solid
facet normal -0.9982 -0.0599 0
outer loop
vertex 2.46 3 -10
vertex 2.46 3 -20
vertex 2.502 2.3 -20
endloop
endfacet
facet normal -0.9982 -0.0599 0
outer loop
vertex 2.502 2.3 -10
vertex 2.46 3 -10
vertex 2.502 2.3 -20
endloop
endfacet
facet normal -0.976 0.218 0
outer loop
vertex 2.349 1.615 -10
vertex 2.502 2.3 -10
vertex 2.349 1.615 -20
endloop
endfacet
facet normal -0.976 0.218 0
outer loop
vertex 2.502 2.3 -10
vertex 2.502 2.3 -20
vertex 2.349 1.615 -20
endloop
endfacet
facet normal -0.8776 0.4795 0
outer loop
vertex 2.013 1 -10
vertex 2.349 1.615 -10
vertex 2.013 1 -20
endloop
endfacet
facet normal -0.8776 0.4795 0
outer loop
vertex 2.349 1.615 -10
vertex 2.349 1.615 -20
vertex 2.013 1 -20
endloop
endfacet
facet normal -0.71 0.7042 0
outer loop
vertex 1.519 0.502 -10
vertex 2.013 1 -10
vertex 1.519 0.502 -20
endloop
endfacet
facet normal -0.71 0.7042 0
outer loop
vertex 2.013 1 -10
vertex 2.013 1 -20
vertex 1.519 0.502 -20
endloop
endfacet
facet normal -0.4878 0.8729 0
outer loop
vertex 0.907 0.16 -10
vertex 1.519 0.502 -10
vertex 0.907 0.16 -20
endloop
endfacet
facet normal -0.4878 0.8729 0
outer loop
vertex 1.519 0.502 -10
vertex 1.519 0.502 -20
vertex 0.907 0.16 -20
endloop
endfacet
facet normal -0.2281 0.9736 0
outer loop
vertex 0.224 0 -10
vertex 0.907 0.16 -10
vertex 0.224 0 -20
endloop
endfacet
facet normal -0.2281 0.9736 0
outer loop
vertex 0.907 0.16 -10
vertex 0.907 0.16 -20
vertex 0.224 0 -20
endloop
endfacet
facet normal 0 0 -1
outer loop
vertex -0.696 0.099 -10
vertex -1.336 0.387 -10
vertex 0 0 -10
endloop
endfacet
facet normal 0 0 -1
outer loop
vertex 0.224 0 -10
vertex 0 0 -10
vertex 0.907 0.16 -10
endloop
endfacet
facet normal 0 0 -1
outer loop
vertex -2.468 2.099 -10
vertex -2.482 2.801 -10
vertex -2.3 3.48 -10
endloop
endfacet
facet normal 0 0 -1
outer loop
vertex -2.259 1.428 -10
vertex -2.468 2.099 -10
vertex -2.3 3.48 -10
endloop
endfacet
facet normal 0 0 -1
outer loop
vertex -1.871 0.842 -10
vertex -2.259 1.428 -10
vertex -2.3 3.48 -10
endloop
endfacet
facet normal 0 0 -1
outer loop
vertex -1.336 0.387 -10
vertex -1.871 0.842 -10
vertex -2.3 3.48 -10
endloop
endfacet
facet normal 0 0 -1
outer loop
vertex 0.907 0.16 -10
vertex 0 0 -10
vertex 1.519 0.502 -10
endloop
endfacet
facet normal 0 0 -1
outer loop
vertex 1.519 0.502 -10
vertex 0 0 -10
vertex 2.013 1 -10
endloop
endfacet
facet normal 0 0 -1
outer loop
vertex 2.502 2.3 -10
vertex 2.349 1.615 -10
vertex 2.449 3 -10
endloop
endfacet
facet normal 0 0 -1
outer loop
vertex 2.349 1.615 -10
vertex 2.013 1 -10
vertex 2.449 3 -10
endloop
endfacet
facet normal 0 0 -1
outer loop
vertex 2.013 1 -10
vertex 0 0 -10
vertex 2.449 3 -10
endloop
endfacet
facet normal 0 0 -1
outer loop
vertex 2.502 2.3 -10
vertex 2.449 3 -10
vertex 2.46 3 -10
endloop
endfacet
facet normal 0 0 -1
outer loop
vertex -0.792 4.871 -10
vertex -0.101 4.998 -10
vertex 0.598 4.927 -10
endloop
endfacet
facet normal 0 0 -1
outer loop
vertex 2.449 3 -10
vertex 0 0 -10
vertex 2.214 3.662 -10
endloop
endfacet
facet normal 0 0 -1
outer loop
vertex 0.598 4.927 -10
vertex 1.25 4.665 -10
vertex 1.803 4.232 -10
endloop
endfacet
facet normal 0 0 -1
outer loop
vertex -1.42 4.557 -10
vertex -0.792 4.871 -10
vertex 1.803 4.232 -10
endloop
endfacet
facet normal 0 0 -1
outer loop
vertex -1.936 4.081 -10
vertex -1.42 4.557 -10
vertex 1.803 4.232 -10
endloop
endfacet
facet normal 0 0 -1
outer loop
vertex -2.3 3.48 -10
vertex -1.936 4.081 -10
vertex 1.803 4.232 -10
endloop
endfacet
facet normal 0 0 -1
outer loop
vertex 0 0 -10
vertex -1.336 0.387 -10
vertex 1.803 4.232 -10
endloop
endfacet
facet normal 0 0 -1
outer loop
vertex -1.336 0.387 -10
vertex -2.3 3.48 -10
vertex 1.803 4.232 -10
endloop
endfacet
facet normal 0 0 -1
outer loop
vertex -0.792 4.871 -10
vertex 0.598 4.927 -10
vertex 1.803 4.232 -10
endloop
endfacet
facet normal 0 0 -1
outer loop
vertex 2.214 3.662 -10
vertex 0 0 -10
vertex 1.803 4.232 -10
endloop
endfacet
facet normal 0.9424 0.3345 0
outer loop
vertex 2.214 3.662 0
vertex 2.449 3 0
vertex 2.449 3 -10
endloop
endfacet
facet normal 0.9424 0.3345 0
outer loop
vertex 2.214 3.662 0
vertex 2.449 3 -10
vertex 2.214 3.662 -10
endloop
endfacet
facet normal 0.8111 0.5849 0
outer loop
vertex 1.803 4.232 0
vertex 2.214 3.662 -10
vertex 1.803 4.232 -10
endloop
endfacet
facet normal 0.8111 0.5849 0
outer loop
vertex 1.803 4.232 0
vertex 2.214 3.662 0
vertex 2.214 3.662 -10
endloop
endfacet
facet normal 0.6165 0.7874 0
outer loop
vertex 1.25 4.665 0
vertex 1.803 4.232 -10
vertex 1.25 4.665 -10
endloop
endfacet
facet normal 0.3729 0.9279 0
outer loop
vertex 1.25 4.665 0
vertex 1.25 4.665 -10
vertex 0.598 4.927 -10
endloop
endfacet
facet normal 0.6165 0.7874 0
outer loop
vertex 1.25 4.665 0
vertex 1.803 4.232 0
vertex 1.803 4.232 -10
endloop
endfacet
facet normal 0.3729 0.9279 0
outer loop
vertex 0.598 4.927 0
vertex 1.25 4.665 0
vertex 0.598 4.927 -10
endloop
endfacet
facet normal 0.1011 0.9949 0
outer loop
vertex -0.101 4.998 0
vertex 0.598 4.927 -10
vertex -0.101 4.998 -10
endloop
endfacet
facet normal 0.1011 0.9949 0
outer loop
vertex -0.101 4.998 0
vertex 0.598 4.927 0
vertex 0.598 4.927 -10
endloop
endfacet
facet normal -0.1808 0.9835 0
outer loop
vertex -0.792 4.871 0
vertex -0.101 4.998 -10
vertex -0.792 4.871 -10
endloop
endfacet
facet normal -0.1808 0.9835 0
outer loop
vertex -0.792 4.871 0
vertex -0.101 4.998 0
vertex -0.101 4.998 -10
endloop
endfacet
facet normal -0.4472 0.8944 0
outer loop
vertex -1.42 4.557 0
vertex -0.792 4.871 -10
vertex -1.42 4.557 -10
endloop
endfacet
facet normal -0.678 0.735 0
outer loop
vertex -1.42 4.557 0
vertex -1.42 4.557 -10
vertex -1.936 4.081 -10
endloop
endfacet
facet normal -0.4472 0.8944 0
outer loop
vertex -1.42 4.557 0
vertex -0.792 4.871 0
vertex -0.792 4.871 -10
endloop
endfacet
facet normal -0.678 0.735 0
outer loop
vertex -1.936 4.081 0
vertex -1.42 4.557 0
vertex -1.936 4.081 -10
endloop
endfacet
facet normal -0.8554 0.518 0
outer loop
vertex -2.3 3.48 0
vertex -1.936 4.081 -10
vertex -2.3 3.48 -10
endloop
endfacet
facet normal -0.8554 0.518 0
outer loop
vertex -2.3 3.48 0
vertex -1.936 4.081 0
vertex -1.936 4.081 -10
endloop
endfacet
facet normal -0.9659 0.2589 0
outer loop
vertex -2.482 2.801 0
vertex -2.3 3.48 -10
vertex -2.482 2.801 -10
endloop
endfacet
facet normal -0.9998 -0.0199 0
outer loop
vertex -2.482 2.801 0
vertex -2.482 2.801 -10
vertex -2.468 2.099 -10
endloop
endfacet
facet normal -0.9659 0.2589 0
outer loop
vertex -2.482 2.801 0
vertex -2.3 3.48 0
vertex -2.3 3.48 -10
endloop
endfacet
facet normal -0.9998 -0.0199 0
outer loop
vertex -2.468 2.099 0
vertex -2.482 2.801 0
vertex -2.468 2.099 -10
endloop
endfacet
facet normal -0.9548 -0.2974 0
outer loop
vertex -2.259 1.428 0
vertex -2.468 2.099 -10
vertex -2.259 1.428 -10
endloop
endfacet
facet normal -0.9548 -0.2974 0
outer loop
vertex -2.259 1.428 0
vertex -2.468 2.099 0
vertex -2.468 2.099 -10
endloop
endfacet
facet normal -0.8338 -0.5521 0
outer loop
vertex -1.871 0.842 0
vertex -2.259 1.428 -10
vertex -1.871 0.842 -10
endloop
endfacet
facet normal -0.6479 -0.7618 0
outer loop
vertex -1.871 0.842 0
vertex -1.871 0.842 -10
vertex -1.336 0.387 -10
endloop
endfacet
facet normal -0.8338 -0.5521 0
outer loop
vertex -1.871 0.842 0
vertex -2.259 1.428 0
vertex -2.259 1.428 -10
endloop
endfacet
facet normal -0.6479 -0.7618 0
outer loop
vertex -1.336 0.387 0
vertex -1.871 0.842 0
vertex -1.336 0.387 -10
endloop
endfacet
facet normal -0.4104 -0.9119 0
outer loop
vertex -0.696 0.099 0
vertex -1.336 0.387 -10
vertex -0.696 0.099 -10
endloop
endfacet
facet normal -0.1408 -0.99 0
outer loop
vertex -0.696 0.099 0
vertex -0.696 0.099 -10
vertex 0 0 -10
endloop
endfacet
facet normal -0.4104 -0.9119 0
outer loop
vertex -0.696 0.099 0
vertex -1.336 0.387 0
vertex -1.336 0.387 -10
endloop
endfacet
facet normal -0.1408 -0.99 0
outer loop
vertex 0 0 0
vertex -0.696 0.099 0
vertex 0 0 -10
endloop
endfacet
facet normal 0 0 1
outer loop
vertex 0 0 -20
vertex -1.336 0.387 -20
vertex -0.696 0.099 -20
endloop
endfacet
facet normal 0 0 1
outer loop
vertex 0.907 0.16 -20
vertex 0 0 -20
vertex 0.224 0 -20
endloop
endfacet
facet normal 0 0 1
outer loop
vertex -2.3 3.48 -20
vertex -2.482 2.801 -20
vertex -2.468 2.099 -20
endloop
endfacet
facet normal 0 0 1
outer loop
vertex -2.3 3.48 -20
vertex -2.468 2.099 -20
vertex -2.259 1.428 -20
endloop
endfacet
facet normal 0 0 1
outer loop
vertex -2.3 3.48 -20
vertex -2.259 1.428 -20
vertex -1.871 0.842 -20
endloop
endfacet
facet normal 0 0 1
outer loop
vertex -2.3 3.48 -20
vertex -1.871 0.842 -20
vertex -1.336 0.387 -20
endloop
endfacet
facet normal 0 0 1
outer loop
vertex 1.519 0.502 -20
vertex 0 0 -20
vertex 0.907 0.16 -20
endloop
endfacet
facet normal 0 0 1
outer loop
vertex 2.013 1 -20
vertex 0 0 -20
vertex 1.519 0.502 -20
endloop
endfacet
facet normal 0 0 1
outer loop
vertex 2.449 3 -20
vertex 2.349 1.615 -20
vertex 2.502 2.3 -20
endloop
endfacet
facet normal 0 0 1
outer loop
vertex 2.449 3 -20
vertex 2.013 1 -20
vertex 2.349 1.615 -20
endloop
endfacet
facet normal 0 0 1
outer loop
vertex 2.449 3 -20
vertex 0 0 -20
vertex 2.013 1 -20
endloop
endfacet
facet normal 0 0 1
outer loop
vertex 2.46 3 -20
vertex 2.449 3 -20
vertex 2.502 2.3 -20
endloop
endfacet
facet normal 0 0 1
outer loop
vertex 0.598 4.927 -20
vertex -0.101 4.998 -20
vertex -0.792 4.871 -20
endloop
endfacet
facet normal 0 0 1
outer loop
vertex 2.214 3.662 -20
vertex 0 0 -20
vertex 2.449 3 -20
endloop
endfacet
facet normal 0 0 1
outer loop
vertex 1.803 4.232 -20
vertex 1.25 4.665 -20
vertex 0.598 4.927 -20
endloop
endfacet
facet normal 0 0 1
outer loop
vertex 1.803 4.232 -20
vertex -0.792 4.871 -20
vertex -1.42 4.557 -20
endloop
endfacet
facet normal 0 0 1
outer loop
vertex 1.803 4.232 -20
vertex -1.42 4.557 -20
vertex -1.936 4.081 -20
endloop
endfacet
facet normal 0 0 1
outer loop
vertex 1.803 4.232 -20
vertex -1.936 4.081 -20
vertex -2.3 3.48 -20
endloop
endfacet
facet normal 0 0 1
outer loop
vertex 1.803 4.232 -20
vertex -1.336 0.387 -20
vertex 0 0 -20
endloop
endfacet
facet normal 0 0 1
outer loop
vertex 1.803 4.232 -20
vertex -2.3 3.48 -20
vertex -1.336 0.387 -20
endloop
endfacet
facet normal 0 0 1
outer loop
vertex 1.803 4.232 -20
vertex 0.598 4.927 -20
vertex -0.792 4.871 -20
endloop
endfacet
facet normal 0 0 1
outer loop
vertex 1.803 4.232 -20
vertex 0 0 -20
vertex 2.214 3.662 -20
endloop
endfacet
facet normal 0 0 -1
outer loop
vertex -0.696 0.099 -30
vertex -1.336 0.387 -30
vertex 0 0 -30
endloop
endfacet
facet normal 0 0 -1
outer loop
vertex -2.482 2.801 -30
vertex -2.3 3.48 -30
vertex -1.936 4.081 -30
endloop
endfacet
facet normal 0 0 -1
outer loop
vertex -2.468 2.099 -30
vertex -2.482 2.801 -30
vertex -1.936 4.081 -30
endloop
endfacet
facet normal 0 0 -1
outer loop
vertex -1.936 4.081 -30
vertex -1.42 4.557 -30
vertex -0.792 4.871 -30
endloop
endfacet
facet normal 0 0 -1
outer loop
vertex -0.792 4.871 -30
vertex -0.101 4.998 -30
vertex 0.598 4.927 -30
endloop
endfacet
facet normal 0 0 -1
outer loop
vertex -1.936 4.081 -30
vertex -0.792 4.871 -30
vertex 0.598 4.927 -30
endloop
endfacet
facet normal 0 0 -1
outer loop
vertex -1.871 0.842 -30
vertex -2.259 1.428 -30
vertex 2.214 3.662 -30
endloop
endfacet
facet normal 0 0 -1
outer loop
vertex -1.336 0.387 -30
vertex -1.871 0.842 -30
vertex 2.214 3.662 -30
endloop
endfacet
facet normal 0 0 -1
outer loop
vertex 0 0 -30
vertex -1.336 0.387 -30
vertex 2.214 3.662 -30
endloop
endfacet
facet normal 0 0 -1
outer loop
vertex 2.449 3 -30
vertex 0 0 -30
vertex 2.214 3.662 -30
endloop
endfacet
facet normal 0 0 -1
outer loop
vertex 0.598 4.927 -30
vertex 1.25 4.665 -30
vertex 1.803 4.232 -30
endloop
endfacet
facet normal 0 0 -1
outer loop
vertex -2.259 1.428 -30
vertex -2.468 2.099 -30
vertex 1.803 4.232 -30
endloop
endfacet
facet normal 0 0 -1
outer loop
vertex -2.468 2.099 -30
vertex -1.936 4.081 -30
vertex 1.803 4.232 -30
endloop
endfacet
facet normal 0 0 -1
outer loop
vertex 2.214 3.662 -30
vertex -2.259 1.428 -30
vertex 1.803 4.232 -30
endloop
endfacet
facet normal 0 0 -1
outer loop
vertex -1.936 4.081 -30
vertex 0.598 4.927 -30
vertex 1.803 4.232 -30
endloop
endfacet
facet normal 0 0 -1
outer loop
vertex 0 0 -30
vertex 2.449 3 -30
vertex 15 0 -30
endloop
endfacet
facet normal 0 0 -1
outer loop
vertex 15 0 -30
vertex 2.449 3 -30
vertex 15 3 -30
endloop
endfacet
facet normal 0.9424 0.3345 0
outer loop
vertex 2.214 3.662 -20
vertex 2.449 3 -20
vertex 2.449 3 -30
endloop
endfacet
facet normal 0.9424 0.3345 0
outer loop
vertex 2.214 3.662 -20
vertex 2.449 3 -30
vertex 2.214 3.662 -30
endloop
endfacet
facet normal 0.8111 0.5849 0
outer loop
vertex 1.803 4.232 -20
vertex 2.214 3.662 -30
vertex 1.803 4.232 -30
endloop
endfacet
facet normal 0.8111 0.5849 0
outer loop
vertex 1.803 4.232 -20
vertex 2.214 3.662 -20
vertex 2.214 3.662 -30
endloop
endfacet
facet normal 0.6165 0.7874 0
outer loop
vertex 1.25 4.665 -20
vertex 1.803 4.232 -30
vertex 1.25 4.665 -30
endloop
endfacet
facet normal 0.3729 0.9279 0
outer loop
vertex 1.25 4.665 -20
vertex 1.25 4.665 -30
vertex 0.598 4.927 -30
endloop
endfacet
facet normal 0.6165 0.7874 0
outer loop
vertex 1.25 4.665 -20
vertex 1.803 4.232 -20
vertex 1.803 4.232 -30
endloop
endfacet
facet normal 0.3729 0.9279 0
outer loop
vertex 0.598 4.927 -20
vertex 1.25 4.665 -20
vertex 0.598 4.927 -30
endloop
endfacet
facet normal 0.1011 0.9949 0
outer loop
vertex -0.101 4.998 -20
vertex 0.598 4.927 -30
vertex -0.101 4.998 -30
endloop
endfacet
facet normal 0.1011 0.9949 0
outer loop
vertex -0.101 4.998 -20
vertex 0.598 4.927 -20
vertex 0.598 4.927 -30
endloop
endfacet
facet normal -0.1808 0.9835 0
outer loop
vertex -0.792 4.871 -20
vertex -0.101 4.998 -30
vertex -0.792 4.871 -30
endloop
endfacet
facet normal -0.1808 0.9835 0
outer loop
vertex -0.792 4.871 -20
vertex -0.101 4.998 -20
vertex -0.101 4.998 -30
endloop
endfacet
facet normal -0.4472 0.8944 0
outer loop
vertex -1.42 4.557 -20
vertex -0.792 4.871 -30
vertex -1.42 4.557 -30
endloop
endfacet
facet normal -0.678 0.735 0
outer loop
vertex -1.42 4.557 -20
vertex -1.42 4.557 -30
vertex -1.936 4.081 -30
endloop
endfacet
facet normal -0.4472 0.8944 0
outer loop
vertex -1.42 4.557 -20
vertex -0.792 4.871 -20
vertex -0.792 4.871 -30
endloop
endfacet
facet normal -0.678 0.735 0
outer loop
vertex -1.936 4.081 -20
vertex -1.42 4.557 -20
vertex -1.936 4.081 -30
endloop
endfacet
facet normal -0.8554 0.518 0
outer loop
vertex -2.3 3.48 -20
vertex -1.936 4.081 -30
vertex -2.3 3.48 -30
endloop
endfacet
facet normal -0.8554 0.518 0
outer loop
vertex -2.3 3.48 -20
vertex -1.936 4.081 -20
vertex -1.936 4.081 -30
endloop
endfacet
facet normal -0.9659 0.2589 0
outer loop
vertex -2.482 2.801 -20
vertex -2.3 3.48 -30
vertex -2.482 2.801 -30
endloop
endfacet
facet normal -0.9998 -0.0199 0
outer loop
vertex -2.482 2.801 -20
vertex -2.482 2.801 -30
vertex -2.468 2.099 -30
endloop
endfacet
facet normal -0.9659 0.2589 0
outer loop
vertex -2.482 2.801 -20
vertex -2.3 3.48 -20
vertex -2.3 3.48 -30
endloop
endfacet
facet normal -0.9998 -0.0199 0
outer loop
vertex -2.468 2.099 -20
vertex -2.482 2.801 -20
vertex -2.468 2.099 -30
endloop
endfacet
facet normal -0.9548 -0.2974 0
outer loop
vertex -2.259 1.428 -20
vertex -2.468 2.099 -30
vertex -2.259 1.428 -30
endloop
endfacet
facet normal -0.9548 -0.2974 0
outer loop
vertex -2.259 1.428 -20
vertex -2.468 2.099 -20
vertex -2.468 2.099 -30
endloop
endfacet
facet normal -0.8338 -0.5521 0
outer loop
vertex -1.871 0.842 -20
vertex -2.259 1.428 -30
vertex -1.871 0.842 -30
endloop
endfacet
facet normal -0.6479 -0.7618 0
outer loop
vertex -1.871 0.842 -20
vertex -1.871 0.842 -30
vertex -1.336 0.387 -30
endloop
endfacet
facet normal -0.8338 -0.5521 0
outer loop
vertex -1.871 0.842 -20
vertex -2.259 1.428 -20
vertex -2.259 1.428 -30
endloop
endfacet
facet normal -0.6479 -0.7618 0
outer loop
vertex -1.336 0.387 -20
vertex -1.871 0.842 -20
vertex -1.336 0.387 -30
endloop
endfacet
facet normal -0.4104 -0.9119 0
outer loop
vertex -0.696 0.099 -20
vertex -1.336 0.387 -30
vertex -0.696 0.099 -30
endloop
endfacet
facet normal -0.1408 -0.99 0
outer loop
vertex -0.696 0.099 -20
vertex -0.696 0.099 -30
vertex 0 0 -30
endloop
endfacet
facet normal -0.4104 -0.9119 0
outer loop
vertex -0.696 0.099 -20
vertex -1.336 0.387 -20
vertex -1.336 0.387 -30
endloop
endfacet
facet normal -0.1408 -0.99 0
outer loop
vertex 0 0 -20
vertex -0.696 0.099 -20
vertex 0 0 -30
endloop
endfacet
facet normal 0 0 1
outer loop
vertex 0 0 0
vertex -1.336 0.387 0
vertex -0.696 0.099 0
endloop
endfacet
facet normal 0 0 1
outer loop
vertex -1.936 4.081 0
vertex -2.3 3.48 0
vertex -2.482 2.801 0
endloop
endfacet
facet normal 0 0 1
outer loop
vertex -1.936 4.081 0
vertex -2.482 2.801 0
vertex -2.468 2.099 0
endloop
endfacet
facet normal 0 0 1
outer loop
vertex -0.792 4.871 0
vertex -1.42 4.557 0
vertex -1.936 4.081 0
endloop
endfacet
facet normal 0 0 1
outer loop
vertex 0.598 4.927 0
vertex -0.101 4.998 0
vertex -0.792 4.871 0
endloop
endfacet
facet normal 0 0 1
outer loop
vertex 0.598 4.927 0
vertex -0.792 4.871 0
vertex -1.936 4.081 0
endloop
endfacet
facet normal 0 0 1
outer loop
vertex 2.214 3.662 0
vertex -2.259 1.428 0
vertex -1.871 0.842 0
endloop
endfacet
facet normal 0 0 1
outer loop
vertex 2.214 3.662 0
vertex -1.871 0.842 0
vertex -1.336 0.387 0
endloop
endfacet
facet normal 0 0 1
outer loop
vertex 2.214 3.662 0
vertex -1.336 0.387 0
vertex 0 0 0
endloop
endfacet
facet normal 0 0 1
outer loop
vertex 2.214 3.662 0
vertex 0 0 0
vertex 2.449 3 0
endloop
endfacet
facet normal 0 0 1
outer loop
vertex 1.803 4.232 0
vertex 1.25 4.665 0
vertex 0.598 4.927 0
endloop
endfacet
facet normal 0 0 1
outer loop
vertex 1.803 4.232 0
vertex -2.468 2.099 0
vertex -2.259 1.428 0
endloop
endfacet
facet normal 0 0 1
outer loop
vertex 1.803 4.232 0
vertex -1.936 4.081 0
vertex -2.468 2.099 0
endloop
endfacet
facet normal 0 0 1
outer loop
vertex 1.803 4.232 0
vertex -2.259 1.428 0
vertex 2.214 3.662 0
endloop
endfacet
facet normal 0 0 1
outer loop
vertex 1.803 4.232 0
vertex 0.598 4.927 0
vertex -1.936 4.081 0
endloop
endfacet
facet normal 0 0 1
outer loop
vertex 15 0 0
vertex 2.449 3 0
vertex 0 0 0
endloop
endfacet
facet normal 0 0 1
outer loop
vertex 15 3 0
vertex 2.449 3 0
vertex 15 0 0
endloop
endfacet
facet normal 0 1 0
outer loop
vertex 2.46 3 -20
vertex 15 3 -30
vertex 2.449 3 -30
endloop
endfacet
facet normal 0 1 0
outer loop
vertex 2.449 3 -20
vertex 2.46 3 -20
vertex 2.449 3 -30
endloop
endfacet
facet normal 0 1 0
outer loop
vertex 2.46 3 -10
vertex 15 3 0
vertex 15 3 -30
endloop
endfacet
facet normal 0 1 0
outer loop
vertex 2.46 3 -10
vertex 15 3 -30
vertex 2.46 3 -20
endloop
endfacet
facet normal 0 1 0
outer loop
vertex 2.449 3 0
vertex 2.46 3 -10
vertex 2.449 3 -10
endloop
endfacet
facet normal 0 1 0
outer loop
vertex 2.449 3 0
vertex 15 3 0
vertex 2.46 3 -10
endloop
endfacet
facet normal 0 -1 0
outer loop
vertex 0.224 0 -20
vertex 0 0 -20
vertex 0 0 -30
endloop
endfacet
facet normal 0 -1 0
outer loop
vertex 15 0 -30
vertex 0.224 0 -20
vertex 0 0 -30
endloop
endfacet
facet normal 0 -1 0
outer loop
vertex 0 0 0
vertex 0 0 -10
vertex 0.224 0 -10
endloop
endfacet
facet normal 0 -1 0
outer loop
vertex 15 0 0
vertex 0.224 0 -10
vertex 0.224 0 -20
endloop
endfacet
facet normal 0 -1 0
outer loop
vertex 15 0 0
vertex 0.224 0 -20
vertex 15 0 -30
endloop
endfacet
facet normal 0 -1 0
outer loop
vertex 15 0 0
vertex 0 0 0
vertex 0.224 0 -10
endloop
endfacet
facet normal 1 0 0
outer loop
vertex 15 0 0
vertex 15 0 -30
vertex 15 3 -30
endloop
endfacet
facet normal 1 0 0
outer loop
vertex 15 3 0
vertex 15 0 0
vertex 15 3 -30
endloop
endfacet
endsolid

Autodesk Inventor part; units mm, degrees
ref_plane "YZ Plane" through (0, 0, 0) normal (1, 0, 0) x (0, 1, 0)
ref_plane "XZ Plane" through (0, 0, 0) normal (0, 1, 0) x (-1, 0, 0)
ref_plane "XY Plane" through (0, 0, 0) normal (0, 0, 1) x (1, 0, 0)
sketch "Sketch1" plane through (0, 0, 0) normal (0, 0, 1) x (1, 0, 0)
  line L0 (0, 0) -> (15, 0)
  line L1 (15, 0) -> (15, 3)
  line L2 (15, 3) -> (0, 3)
  line L3 (0, 3) -> (0, 0)
  circle A0 centre (0, 2.5) radius 2.5
  point P0 (0, 1.5)
  point P1 (2.4495, 3)
  point P2 (2.4495, 3)
  dimension "d0" = 15
  dimension "d1" = 3
  dimension "d2" = 5
extrude "Extrusion1" add sketch "Sketch1" against normal blind 30
ref_plane "Work Plane1" through (0, 0, -20) normal (0, 0, 1) x (1, 0, 0)
sketch "Sketch2" plane through (0, 0, -20) normal (0, 0, 1) x (1, 0, 0)
  arc A0 (2.4495, 3) -> (0, 0) centre (0, 2.5) ccw projected
  circle A1 centre (0, 2.5) radius 2.51
  dimension "d6" = 5.02
extrude "Extrusion2" cut sketch "Sketch2" along normal blind 10
properties part number "Clip2" material "Stainless Steel"
